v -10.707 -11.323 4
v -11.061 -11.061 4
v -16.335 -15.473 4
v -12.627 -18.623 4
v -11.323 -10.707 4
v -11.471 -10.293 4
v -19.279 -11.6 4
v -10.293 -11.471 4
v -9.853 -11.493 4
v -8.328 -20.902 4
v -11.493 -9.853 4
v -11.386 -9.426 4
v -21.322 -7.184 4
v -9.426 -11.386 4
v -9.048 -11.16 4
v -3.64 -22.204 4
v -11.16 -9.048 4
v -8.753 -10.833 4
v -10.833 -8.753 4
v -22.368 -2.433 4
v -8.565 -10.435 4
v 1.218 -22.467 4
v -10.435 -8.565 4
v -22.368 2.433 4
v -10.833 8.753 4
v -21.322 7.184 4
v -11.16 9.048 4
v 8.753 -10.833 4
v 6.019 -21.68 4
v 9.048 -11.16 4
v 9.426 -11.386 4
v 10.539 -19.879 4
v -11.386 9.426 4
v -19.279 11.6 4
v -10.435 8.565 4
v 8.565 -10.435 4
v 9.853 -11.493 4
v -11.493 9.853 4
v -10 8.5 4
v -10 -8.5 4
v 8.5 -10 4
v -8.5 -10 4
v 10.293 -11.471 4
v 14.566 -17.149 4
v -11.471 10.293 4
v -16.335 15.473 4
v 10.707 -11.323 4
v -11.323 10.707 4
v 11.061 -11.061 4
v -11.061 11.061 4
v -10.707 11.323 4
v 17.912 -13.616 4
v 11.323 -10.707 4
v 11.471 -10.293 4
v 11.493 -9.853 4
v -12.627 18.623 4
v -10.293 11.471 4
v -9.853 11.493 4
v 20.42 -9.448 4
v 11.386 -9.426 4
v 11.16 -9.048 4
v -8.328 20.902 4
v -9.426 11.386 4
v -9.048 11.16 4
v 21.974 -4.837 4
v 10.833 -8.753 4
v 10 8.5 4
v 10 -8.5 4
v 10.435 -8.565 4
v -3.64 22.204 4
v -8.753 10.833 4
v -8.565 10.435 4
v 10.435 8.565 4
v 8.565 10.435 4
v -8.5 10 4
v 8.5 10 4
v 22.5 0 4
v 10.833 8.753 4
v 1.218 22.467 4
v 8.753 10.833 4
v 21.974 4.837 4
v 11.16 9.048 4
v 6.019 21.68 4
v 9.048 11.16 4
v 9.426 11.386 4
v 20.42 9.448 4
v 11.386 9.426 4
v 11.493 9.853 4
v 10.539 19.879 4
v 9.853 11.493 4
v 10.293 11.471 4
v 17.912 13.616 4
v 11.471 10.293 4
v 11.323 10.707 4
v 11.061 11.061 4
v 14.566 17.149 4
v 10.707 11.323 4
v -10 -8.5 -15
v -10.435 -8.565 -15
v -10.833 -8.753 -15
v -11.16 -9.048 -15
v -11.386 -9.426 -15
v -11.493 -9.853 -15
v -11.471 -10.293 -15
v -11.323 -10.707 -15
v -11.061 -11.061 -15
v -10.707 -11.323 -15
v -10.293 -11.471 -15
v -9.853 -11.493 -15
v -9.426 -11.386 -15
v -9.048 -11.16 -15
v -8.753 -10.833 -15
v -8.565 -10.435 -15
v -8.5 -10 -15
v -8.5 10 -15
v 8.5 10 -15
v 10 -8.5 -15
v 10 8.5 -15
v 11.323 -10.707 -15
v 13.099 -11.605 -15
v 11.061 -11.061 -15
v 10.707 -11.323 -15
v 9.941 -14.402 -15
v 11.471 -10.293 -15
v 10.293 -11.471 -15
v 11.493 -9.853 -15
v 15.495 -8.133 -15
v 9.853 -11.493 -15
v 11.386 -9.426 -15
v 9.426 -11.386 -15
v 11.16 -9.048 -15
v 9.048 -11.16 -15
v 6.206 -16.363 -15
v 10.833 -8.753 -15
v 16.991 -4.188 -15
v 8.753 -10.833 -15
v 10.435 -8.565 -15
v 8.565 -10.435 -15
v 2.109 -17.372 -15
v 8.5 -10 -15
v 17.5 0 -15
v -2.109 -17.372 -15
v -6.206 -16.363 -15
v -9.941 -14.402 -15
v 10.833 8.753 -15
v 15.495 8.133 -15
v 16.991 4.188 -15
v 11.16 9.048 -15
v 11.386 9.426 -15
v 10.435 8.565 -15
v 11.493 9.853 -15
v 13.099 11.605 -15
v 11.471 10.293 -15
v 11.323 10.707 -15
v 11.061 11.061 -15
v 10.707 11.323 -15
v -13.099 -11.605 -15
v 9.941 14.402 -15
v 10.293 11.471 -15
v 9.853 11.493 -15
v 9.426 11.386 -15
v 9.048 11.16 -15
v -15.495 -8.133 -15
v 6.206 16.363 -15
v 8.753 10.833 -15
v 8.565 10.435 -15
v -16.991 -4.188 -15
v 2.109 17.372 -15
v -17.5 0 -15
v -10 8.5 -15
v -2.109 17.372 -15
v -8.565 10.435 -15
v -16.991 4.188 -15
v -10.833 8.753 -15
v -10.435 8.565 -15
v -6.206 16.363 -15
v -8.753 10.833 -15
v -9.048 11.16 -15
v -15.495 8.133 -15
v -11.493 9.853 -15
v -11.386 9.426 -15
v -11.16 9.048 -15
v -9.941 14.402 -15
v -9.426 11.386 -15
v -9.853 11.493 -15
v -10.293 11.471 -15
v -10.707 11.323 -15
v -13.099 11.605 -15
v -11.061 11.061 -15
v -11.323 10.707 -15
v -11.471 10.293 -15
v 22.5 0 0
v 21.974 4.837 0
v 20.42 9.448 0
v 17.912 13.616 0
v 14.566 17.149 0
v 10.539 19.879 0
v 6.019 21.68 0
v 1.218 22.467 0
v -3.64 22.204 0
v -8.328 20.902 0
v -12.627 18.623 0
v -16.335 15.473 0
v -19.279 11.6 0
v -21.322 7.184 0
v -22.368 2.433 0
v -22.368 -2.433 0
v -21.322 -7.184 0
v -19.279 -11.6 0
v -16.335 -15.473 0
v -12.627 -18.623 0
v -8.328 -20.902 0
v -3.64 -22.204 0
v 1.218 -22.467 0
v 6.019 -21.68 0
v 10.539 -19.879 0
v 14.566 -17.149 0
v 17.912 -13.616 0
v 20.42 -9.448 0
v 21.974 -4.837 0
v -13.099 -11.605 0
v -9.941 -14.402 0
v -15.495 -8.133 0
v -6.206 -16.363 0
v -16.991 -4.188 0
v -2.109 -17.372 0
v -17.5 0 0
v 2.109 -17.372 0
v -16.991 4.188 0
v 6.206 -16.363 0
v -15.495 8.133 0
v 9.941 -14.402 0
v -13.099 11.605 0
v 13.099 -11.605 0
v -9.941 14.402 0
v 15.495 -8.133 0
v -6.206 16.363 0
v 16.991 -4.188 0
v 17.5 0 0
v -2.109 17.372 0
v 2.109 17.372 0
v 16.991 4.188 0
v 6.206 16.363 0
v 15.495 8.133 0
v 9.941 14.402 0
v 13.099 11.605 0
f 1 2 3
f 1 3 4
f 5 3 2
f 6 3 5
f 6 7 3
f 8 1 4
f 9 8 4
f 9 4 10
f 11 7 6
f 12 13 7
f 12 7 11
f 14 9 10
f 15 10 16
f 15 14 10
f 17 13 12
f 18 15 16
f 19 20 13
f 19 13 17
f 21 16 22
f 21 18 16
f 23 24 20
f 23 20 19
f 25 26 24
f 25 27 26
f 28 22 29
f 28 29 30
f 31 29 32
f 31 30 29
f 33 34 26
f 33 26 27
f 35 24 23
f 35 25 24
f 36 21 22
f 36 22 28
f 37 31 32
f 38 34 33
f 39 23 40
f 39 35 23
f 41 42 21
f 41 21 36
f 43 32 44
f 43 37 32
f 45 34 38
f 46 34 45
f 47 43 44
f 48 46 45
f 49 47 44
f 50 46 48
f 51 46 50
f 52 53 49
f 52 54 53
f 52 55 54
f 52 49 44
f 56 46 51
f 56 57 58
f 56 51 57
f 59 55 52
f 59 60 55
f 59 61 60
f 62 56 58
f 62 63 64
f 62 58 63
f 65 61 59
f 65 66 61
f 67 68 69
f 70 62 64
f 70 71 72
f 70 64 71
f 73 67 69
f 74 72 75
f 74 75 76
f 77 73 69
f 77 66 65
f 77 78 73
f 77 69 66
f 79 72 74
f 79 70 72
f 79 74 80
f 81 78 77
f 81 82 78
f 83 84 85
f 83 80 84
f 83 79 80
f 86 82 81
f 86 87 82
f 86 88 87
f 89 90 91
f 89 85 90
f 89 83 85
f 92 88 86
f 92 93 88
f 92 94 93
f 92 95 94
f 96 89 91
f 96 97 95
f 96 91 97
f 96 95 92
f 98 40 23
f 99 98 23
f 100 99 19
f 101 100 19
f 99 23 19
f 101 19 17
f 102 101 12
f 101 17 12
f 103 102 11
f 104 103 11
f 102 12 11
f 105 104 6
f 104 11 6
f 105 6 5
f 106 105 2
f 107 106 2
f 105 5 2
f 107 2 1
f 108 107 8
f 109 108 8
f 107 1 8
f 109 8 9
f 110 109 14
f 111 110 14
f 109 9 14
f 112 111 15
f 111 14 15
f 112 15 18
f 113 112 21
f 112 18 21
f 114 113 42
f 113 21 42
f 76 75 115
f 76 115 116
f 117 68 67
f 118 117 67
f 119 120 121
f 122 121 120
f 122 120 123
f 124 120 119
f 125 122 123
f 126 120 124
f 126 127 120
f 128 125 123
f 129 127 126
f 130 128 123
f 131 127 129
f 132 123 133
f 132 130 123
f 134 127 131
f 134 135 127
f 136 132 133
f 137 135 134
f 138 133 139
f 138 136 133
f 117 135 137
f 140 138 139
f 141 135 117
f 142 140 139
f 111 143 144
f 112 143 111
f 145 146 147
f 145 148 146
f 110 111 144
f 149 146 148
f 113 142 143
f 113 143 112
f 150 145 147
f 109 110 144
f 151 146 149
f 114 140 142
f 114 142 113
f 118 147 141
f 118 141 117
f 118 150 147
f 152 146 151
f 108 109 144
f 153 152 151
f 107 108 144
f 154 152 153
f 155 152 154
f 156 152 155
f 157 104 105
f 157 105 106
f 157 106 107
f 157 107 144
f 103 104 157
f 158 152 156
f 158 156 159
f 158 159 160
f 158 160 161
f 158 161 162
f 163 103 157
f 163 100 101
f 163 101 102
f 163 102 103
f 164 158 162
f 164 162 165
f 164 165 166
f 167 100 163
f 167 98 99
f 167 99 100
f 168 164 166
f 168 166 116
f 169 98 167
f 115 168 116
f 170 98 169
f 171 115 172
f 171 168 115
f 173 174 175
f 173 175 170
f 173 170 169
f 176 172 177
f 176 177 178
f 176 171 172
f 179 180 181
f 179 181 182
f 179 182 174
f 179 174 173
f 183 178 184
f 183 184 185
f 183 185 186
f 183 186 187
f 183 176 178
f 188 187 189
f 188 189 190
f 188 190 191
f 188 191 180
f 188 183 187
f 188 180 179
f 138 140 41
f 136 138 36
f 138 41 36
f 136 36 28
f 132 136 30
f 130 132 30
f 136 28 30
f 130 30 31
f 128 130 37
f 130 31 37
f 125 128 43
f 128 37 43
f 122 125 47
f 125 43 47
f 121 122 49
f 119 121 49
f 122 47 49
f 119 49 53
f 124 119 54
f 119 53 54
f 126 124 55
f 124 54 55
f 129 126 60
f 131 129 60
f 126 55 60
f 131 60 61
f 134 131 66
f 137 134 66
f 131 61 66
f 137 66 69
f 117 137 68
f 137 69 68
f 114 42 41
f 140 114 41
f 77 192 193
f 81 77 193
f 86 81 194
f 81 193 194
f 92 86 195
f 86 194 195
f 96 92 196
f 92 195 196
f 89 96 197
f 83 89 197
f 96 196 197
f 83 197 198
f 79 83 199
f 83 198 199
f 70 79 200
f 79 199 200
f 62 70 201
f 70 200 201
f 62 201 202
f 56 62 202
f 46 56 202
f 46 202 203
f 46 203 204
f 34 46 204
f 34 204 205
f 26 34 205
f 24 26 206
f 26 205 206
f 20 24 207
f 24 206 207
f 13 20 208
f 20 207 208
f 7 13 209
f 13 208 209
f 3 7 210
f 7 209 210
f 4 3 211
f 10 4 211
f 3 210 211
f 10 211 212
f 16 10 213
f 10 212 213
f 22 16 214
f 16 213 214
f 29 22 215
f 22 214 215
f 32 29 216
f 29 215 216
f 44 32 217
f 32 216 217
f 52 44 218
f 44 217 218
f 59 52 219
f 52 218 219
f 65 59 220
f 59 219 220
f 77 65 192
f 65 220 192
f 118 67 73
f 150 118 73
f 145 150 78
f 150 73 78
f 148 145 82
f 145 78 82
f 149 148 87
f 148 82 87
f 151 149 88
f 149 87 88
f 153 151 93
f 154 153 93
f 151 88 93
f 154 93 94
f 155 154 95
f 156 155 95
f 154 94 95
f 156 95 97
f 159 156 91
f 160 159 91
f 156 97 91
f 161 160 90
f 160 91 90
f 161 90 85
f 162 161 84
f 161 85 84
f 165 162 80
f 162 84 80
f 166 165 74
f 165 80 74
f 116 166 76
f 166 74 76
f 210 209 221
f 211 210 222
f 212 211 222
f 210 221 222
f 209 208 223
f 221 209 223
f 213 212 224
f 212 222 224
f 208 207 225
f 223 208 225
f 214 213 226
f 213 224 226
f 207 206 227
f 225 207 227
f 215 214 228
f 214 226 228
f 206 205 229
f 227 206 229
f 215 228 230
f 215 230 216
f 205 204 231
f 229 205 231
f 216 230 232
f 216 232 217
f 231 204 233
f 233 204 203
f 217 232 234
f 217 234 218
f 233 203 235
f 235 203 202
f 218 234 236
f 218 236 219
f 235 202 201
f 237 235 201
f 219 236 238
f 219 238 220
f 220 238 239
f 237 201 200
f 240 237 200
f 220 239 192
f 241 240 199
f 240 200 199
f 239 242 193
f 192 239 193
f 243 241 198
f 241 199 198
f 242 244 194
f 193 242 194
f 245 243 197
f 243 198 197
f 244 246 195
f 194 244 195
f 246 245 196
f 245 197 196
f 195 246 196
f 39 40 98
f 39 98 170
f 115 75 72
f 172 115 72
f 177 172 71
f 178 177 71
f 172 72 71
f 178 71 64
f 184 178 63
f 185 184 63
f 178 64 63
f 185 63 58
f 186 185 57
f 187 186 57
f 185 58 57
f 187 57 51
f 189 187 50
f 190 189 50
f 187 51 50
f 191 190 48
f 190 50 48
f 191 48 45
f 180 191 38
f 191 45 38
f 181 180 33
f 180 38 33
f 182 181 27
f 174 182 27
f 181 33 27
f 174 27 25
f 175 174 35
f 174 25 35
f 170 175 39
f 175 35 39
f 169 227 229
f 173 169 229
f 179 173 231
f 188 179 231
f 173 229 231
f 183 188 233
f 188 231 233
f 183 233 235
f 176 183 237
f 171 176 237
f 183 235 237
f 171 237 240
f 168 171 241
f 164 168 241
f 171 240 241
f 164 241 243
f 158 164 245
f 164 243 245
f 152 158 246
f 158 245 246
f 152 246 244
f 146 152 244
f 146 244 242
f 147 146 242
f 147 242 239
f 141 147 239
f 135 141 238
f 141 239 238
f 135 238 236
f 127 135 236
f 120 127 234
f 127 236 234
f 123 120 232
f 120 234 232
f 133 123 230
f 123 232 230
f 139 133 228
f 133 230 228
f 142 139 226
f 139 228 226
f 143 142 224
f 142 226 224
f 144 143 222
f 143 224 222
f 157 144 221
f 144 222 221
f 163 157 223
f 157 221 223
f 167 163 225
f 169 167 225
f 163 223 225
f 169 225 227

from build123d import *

# Parameters (mm, degrees)
SKETCH_1_R          = 22.5
EXTRUDE_1_DEPTH     = 4
SKETCH_2_R          = 17.5
EXTRUDE_2_DEPTH     = 15
SKETCH_3_R          = 1.5
SKETCH_3_W          = 20
SKETCH_3_H          = 20
CUT_EXTRUDE_1_DEPTH = 38.06076092


with BuildPart() as part:
    # 草图1 → 凸台-拉伸1 (new body)
    with BuildSketch(Plane.XY):
        Circle(SKETCH_1_R)
    extrude(amount=EXTRUDE_1_DEPTH)

    # 草图2 → 凸台-拉伸2 (add)
    with BuildSketch(Plane(origin=(0, 0, 0), x_dir=(-1, 0, 0), z_dir=(0, 0, -1))):
        Circle(SKETCH_2_R)
    extrude(amount=EXTRUDE_2_DEPTH)

    # 草图3 → 切除-拉伸1 (cut, through all)
    with BuildSketch(Plane.XY.offset(4)):
        with BuildLine():
            ThreePointArc((-8.5, -10), (-8.939339828, -8.939339828), (-10, -8.5))
            Line((-10, -8.5), (-10, -10))
            Line((-10, -10), (-8.5, -10))
        make_face()
        with BuildLine():
            Line((-10, -10), (-10, -8.5))
            ThreePointArc((-10, -8.5), (-11.060660172, -11.060660172), (-8.5, -10))
            Line((-8.5, -10), (-10, -10))
        make_face()
        with Locations((-10, -10)):
            Circle(SKETCH_3_R)
        with Locations((10, -10)):
            Circle(SKETCH_3_R)
        with Locations((10, 10)):
            Circle(SKETCH_3_R)
        with Locations((-10, 10)):
            Circle(SKETCH_3_R)
        Rectangle(SKETCH_3_W, SKETCH_3_H)
        with BuildLine():
            ThreePointArc((11.5, -10), (11.060660172, -8.939339828), (10, -8.5))
            Line((10, -8.5), (10, -10))
            Line((10, -10), (8.5, -10))
            ThreePointArc((8.5, -10), (10, -11.5), (11.5, -10))
        make_face()
        with BuildLine():
            Line((10, -10), (10, -8.5))
            ThreePointArc((10, -8.5), (8.939339828, -8.939339828), (8.5, -10))
            Line((8.5, -10), (10, -10))
        make_face()
        with BuildLine():
            ThreePointArc((11.5, 10), (10, 11.5), (8.5, 10))
            Line((8.5, 10), (10, 10))
            Line((10, 10), (10, 8.5))
            ThreePointArc((10, 8.5), (11.060660172, 8.939339828), (11.5, 10))
        make_face()
        with BuildLine():
            Line((10, 10), (8.5, 10))
            ThreePointArc((8.5, 10), (8.939339828, 8.939339828), (10, 8.5))
            Line((10, 8.5), (10, 10))
        make_face()
        with BuildLine():
            Line((-10, 8.5), (-10, 10))
            Line((-10, 10), (-8.5, 10))
            ThreePointArc((-8.5, 10), (-11.060660172, 11.060660172), (-10, 8.5))
        make_face()
        with BuildLine():
            Line((-8.5, 10), (-10, 10))
            Line((-10, 10), (-10, 8.5))
            ThreePointArc((-10, 8.5), (-8.939339828, 8.939339828), (-8.5, 10))
        make_face()
    extrude(amount=-CUT_EXTRUDE_1_DEPTH, mode=Mode.SUBTRACT)


solid = part.part
